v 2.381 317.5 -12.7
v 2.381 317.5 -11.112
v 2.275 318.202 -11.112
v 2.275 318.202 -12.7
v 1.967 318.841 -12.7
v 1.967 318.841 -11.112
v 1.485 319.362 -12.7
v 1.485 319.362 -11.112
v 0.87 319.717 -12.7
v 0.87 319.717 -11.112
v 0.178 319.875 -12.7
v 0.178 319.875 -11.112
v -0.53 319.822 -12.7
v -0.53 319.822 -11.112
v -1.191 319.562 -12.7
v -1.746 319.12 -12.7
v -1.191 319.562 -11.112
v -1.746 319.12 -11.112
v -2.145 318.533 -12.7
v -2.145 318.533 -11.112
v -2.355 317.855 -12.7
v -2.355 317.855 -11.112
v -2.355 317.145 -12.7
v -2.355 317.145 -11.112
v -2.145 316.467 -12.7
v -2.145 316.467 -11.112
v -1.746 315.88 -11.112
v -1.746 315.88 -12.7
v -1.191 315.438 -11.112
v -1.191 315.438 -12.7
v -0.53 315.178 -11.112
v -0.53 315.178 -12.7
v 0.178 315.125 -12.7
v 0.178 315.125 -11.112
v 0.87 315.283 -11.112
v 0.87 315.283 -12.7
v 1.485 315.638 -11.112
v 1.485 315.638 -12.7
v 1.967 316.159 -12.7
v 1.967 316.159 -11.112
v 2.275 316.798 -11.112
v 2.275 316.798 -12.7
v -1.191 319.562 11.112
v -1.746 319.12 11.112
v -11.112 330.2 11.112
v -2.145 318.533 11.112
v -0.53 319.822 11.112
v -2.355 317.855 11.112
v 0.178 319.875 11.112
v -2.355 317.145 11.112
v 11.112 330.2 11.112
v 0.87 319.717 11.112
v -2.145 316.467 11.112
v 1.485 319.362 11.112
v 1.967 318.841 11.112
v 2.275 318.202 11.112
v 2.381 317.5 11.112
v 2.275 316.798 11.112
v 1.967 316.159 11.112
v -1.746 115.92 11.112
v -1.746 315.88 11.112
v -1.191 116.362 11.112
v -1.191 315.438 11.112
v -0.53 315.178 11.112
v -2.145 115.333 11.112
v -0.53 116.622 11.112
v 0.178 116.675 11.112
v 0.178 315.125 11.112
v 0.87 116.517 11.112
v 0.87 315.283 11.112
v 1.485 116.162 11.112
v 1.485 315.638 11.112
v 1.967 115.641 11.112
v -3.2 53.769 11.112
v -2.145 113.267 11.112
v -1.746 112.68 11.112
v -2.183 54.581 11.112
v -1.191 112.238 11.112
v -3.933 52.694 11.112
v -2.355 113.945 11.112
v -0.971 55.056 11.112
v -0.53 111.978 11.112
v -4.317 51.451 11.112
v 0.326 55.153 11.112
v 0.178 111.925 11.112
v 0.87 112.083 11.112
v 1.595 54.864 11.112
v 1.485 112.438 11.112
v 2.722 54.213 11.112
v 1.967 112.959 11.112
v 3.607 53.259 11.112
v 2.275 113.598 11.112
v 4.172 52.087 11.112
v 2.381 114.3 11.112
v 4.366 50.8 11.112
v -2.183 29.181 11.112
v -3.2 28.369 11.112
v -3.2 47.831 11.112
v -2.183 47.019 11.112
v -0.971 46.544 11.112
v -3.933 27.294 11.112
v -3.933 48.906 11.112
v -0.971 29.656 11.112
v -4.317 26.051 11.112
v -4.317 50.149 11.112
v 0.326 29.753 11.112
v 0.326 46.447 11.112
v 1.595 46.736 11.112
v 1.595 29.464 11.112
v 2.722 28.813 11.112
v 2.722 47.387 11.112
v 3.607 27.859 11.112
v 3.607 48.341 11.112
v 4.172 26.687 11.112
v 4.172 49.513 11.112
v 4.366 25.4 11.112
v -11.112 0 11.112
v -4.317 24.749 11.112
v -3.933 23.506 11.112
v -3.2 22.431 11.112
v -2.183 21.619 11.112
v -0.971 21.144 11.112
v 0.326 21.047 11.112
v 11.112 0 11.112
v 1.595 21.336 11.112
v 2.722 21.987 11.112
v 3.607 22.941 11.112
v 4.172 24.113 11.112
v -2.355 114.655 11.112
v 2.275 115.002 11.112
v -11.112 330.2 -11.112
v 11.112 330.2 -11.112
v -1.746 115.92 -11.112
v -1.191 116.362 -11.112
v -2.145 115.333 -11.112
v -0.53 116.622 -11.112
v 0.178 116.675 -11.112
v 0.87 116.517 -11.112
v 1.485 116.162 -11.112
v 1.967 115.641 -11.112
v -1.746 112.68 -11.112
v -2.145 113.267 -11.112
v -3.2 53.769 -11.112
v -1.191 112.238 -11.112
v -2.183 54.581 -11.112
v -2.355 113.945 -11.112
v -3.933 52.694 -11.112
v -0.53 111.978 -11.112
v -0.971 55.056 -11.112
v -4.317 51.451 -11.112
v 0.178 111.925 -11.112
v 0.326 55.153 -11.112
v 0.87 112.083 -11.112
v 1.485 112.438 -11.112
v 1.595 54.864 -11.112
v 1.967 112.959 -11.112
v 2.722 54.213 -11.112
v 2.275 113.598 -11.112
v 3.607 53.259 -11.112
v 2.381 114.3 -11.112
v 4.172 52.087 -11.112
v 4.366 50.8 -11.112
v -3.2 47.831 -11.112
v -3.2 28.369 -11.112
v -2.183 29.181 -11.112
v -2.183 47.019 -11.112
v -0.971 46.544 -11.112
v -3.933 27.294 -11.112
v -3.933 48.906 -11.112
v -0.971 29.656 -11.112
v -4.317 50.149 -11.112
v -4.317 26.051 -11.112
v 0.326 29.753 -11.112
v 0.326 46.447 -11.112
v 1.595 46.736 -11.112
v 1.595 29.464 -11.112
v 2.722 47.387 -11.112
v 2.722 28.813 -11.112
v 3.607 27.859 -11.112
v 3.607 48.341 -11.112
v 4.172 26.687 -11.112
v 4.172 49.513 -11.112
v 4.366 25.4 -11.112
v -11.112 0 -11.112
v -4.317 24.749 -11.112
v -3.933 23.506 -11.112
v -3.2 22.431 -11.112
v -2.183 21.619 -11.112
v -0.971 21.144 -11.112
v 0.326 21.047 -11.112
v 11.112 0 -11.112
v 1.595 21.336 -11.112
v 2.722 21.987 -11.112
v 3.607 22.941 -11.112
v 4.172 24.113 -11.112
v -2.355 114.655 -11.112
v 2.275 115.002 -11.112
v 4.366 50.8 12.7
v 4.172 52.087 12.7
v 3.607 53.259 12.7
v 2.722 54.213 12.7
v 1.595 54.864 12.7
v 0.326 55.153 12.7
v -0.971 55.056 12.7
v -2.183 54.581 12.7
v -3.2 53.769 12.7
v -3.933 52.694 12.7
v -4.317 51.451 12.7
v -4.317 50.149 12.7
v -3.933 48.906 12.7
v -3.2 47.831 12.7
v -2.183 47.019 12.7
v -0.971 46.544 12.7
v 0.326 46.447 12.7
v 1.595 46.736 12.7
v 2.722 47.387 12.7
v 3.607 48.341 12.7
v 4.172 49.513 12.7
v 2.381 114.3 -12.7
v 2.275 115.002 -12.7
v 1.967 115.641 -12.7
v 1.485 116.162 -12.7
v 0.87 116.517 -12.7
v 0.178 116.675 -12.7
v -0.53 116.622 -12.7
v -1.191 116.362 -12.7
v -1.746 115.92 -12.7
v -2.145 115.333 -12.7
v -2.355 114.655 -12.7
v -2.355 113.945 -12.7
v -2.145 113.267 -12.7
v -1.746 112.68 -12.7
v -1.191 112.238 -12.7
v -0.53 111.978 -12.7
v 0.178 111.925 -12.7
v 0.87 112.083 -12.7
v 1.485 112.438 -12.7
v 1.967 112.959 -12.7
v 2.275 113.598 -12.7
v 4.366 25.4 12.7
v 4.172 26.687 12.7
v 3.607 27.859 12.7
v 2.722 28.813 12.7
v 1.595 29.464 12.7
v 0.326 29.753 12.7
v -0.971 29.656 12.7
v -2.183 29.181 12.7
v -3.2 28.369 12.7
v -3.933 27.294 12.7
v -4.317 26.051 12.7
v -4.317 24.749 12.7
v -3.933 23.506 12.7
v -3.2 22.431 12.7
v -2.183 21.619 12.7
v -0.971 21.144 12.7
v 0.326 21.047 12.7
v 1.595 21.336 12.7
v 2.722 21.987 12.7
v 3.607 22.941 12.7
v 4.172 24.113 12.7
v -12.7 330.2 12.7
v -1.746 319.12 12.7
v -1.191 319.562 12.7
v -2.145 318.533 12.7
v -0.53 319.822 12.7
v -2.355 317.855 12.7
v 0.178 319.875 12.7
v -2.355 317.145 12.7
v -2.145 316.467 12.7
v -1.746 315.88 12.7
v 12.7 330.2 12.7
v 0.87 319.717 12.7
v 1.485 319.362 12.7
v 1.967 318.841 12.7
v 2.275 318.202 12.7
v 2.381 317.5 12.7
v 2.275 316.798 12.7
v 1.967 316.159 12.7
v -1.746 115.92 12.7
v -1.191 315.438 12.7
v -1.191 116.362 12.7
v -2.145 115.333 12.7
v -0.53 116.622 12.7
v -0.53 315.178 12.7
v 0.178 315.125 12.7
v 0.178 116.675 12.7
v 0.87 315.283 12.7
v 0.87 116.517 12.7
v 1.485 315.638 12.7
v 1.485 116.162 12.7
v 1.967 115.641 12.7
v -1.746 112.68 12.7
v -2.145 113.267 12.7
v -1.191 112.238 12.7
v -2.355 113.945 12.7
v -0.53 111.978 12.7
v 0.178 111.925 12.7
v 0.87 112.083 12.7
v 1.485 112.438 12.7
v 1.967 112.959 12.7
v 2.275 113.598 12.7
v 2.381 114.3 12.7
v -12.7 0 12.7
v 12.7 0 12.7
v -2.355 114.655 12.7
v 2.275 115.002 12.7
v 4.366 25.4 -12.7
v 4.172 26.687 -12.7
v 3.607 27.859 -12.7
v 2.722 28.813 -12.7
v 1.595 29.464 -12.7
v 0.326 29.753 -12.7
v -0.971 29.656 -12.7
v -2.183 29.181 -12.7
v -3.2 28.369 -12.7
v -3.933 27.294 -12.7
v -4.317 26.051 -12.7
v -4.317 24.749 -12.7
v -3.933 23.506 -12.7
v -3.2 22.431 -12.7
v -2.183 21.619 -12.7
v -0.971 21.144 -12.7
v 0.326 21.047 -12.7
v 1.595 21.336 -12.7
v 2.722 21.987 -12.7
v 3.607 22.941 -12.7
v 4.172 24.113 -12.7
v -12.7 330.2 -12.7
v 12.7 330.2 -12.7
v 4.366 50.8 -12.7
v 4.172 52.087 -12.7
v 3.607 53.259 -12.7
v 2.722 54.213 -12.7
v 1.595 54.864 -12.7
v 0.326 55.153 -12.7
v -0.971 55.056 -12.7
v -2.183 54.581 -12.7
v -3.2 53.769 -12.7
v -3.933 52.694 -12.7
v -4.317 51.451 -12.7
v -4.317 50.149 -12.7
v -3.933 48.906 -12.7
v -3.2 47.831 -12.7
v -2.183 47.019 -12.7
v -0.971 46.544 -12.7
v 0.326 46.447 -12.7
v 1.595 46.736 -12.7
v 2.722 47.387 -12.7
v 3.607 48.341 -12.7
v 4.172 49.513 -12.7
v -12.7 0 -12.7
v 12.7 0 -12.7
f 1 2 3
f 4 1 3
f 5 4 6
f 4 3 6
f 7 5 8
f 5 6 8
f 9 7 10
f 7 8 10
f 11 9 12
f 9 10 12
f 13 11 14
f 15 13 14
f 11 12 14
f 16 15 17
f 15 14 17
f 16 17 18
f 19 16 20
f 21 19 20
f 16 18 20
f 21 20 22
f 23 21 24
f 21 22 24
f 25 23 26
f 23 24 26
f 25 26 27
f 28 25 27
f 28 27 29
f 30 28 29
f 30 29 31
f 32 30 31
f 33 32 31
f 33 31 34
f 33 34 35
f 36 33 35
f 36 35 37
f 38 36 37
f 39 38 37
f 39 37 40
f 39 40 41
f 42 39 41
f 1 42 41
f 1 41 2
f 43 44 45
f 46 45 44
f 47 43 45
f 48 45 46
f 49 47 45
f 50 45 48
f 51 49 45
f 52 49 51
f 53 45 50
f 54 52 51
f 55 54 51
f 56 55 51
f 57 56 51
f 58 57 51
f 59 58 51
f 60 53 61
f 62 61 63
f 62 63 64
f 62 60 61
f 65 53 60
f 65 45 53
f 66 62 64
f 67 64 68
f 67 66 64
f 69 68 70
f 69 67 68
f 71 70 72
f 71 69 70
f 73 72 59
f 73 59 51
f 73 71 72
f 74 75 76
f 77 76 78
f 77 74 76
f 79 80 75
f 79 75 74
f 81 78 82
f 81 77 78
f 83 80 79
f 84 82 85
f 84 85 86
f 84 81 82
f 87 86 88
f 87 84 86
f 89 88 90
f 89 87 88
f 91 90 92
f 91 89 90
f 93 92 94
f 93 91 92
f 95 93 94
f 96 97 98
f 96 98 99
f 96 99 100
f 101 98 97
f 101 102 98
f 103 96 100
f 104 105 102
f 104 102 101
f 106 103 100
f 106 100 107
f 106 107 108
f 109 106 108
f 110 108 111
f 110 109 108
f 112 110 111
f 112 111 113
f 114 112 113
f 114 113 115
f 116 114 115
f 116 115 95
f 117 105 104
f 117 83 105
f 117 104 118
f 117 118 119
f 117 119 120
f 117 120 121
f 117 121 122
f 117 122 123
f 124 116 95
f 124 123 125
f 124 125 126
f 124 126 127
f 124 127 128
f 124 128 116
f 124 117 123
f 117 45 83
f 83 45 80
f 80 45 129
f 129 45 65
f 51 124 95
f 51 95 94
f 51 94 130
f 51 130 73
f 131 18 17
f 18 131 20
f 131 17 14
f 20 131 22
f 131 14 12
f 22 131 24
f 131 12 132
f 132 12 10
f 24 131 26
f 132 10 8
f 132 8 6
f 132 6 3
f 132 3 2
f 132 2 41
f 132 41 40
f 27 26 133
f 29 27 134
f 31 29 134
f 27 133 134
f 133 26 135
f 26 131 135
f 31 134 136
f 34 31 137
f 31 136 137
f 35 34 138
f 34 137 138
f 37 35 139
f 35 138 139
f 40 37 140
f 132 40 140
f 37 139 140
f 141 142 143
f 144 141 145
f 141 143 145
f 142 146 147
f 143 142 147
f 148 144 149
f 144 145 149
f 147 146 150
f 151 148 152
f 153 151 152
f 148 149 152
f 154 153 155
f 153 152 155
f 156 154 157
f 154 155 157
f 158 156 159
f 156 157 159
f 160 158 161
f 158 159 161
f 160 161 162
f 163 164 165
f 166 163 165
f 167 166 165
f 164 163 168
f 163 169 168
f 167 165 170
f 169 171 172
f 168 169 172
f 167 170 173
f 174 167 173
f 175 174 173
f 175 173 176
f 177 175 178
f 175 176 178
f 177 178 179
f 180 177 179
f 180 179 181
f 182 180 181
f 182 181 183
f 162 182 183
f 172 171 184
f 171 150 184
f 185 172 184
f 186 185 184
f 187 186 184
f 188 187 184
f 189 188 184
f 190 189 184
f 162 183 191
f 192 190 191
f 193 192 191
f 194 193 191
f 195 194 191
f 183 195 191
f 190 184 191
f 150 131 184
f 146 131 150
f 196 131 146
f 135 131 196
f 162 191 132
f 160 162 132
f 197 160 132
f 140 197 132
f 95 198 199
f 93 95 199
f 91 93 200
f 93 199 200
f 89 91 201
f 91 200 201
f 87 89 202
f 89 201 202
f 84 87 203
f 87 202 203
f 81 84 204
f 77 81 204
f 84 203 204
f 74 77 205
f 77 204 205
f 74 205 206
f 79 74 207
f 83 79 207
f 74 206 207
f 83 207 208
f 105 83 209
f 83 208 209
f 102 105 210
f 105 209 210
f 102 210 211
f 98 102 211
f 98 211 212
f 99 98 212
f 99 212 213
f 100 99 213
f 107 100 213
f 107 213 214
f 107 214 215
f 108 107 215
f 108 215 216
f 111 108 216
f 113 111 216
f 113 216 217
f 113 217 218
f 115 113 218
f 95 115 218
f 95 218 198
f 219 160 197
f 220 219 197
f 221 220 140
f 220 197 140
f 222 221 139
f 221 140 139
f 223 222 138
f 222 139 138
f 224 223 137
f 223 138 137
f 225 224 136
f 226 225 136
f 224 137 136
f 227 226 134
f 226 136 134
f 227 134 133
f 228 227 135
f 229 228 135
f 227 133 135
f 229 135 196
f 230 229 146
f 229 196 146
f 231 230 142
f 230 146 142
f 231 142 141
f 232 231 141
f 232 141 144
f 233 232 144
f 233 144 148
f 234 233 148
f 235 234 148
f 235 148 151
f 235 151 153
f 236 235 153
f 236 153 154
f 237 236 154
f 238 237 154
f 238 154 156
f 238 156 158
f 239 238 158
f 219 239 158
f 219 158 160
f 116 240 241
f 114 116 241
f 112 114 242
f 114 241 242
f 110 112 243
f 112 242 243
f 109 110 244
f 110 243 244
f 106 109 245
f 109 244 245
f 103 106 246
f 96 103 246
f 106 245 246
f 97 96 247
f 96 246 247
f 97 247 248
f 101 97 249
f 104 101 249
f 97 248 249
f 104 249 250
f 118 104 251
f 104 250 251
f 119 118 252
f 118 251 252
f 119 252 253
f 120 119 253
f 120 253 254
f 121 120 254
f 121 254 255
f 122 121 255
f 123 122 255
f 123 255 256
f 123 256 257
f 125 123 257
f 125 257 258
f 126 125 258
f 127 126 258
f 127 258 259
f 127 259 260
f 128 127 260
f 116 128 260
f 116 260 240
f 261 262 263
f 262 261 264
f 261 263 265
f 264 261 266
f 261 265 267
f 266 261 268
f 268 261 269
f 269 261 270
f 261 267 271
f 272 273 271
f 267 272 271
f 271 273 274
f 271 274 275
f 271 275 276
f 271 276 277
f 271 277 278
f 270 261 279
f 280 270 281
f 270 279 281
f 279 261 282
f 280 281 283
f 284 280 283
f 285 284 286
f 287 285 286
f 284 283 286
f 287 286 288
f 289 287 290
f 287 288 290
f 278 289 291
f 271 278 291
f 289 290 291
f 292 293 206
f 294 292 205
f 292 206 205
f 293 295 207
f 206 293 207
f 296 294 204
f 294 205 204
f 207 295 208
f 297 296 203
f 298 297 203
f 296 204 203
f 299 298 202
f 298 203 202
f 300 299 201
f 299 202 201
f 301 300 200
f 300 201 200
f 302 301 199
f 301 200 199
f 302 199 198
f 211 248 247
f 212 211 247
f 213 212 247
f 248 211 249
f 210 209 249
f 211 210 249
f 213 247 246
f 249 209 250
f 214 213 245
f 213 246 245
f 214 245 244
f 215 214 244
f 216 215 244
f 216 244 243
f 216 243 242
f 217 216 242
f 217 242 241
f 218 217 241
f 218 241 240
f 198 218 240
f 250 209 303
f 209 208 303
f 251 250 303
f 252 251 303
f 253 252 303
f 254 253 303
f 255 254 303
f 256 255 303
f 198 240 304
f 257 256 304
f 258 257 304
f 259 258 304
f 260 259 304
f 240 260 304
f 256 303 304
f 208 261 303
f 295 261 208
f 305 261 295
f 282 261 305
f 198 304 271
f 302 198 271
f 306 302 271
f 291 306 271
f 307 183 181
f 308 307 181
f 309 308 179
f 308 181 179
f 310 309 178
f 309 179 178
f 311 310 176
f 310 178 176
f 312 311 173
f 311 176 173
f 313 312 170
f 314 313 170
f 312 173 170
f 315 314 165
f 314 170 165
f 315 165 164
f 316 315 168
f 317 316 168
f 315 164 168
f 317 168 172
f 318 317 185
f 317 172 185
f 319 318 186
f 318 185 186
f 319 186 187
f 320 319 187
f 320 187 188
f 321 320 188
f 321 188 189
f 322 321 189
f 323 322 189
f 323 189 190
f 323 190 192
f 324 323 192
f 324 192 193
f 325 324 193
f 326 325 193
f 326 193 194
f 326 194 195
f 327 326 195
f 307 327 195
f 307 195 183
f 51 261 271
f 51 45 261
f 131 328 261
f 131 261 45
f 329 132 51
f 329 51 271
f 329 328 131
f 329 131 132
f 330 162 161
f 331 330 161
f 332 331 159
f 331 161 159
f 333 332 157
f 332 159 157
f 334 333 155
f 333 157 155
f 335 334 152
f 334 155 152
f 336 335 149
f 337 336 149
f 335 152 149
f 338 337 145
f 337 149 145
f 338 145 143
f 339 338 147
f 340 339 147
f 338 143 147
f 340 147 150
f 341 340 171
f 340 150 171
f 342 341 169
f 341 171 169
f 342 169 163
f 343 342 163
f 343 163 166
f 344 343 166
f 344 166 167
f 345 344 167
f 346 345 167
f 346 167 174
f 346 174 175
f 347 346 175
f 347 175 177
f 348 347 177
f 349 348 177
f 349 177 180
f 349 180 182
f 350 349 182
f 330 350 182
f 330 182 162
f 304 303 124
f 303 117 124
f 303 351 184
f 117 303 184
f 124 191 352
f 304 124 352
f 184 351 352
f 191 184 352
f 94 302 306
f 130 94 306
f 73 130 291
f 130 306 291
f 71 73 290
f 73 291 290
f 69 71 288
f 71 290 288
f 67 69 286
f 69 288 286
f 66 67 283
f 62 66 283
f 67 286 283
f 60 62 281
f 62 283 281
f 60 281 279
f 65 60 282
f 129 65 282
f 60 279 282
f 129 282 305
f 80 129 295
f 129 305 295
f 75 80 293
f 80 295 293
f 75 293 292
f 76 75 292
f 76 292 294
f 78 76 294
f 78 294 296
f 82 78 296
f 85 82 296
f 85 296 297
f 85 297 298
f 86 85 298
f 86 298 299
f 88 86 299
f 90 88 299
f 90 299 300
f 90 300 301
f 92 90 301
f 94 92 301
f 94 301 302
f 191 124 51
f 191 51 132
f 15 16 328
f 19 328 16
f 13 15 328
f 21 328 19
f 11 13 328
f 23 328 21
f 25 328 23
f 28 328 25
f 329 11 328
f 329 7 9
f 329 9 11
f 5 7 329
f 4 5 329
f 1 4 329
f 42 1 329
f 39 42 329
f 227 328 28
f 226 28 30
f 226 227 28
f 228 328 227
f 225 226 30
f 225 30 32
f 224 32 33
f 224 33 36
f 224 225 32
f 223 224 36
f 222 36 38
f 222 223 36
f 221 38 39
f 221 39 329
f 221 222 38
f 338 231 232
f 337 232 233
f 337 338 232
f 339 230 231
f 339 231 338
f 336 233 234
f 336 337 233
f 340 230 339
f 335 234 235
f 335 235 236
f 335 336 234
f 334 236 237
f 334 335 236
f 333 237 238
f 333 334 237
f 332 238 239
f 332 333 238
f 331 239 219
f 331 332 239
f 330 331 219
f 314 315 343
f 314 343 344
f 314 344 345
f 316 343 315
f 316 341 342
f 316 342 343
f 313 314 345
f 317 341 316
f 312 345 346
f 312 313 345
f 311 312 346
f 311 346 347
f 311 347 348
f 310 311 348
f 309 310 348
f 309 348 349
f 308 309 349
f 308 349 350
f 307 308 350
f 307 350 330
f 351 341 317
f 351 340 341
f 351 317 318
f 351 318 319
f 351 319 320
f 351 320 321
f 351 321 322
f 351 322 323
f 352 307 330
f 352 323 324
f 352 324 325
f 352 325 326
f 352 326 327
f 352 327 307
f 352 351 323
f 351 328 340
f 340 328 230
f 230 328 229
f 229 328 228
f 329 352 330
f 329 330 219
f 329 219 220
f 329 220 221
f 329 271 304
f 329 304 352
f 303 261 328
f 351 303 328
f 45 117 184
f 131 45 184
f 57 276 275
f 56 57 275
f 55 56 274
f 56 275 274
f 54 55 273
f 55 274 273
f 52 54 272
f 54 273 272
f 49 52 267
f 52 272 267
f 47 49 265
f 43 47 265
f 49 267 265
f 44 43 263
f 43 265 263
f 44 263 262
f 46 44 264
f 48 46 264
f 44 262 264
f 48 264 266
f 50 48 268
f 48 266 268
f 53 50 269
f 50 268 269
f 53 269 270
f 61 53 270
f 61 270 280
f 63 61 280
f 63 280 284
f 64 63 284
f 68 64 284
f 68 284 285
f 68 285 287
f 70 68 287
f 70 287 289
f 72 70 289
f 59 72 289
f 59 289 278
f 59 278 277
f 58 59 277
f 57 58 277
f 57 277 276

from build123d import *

# Parameters (mm, degrees)
SKETCH1_W           = 25.4
SKETCH1_H           = 25.4
SKETCH1_W_2         = 22.225
SKETCH1_H_2         = 22.225
BOSS_EXTRUDE1_DEPTH = 330.2
SKETCH2_R           = 4.365625
SKETCH2_R_2         = 2.38125
CUT_EXTRUDE1_DEPTH  = 25.4


with BuildPart() as part:
    # Sketch1 → Boss-Extrude1 (new body)
    with BuildSketch(Plane(origin=(0, 0, 0), x_dir=(1, 0, 0), z_dir=(0, 1, 0))):
        Rectangle(SKETCH1_W, SKETCH1_H)
        Rectangle(SKETCH1_W_2, SKETCH1_H_2, mode=Mode.SUBTRACT)
    extrude(amount=BOSS_EXTRUDE1_DEPTH)

    # Sketch2 → Cut-Extrude1 (cut)
    with BuildSketch(Plane.XY.offset(12.7)):
        with Locations((0, 25.4)):
            Circle(SKETCH2_R)
        with Locations((0, 50.8)):
            Circle(SKETCH2_R)
        with Locations((0, 317.5)):
            Circle(SKETCH2_R_2)
        with Locations((0, 114.3)):
            Circle(SKETCH2_R_2)
    extrude(amount=-CUT_EXTRUDE1_DEPTH, mode=Mode.SUBTRACT)


solid = part.part
